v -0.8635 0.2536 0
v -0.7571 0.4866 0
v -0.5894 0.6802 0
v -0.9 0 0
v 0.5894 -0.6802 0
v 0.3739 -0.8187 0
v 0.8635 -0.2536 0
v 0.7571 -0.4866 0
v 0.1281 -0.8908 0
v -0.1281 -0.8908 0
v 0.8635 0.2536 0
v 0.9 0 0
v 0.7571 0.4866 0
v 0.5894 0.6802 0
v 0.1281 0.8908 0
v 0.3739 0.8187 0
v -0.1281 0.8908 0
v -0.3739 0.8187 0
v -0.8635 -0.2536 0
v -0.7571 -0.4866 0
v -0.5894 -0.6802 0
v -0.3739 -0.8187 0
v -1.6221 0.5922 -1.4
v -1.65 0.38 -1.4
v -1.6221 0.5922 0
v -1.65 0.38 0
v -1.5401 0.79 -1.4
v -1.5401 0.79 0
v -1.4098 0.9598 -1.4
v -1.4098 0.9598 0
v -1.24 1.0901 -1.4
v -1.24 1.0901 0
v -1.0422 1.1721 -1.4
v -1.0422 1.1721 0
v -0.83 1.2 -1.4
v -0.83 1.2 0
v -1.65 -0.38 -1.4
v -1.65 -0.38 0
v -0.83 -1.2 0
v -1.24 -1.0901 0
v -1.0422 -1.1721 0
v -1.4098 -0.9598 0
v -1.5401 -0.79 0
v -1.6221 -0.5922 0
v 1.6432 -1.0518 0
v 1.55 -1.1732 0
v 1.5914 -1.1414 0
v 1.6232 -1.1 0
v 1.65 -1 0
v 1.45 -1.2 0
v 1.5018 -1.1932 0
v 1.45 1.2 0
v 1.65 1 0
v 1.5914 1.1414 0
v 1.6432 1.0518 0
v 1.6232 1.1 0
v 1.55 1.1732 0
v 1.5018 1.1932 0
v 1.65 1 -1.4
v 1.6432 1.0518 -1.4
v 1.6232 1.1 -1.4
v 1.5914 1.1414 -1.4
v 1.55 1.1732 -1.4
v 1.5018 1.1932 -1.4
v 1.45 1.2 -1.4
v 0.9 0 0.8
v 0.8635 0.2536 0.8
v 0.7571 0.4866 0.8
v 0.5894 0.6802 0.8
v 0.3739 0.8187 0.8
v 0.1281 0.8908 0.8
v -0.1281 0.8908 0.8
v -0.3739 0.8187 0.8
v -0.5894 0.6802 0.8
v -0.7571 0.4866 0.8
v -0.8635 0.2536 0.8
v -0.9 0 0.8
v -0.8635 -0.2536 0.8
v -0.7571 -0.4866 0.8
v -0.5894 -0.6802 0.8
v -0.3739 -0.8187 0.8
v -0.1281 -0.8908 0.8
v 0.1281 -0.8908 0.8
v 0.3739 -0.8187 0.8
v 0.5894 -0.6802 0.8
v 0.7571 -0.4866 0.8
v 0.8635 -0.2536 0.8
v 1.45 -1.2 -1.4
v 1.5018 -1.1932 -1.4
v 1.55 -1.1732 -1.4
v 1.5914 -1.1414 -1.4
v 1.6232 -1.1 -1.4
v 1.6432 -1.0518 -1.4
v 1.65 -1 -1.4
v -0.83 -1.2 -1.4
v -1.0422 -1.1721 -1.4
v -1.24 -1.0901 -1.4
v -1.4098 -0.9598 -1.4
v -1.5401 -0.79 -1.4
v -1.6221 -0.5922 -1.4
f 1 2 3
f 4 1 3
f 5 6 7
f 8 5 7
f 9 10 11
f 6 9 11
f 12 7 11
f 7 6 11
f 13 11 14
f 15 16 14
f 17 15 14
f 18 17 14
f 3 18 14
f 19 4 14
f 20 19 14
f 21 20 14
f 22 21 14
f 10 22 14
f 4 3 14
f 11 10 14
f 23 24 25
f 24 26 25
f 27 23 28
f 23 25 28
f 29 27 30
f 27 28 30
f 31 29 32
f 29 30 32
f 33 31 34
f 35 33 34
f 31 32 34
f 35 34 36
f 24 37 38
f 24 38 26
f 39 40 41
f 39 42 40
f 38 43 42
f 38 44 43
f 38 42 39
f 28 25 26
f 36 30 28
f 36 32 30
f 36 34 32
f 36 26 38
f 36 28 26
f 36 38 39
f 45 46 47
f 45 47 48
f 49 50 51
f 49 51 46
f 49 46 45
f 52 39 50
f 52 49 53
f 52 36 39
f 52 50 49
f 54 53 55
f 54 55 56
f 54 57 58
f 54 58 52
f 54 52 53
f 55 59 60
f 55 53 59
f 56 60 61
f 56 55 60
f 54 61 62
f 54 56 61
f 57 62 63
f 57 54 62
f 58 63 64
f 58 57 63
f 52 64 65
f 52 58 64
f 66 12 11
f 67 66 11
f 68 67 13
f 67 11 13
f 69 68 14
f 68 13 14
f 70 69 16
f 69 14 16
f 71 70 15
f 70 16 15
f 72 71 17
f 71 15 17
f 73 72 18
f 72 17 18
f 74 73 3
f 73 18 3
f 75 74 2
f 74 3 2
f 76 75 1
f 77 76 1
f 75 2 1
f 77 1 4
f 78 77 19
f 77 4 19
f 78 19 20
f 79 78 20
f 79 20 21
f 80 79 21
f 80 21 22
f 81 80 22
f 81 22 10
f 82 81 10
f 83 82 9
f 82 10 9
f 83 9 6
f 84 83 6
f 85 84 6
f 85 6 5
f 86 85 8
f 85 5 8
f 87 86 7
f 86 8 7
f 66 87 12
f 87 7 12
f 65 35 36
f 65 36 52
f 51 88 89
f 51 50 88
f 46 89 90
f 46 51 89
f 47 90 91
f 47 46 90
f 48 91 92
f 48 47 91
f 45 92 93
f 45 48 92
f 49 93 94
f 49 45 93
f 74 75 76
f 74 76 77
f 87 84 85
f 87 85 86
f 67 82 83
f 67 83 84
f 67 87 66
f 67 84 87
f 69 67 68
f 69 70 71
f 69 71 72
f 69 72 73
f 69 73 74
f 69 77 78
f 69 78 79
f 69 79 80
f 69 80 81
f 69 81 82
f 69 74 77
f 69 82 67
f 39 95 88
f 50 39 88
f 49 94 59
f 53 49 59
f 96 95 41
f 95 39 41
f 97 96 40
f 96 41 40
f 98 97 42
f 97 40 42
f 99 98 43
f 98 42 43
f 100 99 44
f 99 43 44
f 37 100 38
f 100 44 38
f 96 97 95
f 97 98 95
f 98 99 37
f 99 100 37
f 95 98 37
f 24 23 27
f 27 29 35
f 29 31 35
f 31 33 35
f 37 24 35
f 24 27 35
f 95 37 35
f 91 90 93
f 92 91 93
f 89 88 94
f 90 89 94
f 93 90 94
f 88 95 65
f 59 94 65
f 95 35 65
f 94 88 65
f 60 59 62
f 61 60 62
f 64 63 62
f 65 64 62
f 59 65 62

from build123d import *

# Parameters (mm, degrees)
CYLINDER_R     = 0.9
CYLINDER_DEPTH = 0.8
BOX_W          = 3.3
BOX_H          = 2.4
BOX_DEPTH      = 1.4
FILLET_R       = 0.2
FILLET001_R    = 0.82


with BuildPart() as cylinder:
    # Cylinder → Cylinder (new body)
    with BuildSketch(Plane.XY):
        Circle(CYLINDER_R)
    extrude(amount=CYLINDER_DEPTH)


with BuildPart() as fillet001:
    # Box → Box (new body)
    with BuildSketch(Plane(origin=(-1.65, -1.2, -1.4), x_dir=(1, 0, 0), z_dir=(0, 0, 1))):
        with Locations((1.65, 1.2)):
            Rectangle(BOX_W, BOX_H)
    extrude(amount=BOX_DEPTH)

    # Fillet
    fillet_edges = [fillet001.edges().sort_by_distance(p)[0] for p in [
        (1.65, -1.2, -0.7),
        (1.65, 1.2, -0.7),
    ]]
    fillet(fillet_edges, radius=FILLET_R)

    # Fillet001
    fillet001_edges = [fillet001.edges().sort_by_distance(p)[0] for p in [
        (-1.65, 1.2, -0.7),
        (-1.65, -1.2, -0.7),
    ]]
    fillet(fillet001_edges, radius=FILLET001_R)


solid = Compound([cylinder.part, fillet001.part])
